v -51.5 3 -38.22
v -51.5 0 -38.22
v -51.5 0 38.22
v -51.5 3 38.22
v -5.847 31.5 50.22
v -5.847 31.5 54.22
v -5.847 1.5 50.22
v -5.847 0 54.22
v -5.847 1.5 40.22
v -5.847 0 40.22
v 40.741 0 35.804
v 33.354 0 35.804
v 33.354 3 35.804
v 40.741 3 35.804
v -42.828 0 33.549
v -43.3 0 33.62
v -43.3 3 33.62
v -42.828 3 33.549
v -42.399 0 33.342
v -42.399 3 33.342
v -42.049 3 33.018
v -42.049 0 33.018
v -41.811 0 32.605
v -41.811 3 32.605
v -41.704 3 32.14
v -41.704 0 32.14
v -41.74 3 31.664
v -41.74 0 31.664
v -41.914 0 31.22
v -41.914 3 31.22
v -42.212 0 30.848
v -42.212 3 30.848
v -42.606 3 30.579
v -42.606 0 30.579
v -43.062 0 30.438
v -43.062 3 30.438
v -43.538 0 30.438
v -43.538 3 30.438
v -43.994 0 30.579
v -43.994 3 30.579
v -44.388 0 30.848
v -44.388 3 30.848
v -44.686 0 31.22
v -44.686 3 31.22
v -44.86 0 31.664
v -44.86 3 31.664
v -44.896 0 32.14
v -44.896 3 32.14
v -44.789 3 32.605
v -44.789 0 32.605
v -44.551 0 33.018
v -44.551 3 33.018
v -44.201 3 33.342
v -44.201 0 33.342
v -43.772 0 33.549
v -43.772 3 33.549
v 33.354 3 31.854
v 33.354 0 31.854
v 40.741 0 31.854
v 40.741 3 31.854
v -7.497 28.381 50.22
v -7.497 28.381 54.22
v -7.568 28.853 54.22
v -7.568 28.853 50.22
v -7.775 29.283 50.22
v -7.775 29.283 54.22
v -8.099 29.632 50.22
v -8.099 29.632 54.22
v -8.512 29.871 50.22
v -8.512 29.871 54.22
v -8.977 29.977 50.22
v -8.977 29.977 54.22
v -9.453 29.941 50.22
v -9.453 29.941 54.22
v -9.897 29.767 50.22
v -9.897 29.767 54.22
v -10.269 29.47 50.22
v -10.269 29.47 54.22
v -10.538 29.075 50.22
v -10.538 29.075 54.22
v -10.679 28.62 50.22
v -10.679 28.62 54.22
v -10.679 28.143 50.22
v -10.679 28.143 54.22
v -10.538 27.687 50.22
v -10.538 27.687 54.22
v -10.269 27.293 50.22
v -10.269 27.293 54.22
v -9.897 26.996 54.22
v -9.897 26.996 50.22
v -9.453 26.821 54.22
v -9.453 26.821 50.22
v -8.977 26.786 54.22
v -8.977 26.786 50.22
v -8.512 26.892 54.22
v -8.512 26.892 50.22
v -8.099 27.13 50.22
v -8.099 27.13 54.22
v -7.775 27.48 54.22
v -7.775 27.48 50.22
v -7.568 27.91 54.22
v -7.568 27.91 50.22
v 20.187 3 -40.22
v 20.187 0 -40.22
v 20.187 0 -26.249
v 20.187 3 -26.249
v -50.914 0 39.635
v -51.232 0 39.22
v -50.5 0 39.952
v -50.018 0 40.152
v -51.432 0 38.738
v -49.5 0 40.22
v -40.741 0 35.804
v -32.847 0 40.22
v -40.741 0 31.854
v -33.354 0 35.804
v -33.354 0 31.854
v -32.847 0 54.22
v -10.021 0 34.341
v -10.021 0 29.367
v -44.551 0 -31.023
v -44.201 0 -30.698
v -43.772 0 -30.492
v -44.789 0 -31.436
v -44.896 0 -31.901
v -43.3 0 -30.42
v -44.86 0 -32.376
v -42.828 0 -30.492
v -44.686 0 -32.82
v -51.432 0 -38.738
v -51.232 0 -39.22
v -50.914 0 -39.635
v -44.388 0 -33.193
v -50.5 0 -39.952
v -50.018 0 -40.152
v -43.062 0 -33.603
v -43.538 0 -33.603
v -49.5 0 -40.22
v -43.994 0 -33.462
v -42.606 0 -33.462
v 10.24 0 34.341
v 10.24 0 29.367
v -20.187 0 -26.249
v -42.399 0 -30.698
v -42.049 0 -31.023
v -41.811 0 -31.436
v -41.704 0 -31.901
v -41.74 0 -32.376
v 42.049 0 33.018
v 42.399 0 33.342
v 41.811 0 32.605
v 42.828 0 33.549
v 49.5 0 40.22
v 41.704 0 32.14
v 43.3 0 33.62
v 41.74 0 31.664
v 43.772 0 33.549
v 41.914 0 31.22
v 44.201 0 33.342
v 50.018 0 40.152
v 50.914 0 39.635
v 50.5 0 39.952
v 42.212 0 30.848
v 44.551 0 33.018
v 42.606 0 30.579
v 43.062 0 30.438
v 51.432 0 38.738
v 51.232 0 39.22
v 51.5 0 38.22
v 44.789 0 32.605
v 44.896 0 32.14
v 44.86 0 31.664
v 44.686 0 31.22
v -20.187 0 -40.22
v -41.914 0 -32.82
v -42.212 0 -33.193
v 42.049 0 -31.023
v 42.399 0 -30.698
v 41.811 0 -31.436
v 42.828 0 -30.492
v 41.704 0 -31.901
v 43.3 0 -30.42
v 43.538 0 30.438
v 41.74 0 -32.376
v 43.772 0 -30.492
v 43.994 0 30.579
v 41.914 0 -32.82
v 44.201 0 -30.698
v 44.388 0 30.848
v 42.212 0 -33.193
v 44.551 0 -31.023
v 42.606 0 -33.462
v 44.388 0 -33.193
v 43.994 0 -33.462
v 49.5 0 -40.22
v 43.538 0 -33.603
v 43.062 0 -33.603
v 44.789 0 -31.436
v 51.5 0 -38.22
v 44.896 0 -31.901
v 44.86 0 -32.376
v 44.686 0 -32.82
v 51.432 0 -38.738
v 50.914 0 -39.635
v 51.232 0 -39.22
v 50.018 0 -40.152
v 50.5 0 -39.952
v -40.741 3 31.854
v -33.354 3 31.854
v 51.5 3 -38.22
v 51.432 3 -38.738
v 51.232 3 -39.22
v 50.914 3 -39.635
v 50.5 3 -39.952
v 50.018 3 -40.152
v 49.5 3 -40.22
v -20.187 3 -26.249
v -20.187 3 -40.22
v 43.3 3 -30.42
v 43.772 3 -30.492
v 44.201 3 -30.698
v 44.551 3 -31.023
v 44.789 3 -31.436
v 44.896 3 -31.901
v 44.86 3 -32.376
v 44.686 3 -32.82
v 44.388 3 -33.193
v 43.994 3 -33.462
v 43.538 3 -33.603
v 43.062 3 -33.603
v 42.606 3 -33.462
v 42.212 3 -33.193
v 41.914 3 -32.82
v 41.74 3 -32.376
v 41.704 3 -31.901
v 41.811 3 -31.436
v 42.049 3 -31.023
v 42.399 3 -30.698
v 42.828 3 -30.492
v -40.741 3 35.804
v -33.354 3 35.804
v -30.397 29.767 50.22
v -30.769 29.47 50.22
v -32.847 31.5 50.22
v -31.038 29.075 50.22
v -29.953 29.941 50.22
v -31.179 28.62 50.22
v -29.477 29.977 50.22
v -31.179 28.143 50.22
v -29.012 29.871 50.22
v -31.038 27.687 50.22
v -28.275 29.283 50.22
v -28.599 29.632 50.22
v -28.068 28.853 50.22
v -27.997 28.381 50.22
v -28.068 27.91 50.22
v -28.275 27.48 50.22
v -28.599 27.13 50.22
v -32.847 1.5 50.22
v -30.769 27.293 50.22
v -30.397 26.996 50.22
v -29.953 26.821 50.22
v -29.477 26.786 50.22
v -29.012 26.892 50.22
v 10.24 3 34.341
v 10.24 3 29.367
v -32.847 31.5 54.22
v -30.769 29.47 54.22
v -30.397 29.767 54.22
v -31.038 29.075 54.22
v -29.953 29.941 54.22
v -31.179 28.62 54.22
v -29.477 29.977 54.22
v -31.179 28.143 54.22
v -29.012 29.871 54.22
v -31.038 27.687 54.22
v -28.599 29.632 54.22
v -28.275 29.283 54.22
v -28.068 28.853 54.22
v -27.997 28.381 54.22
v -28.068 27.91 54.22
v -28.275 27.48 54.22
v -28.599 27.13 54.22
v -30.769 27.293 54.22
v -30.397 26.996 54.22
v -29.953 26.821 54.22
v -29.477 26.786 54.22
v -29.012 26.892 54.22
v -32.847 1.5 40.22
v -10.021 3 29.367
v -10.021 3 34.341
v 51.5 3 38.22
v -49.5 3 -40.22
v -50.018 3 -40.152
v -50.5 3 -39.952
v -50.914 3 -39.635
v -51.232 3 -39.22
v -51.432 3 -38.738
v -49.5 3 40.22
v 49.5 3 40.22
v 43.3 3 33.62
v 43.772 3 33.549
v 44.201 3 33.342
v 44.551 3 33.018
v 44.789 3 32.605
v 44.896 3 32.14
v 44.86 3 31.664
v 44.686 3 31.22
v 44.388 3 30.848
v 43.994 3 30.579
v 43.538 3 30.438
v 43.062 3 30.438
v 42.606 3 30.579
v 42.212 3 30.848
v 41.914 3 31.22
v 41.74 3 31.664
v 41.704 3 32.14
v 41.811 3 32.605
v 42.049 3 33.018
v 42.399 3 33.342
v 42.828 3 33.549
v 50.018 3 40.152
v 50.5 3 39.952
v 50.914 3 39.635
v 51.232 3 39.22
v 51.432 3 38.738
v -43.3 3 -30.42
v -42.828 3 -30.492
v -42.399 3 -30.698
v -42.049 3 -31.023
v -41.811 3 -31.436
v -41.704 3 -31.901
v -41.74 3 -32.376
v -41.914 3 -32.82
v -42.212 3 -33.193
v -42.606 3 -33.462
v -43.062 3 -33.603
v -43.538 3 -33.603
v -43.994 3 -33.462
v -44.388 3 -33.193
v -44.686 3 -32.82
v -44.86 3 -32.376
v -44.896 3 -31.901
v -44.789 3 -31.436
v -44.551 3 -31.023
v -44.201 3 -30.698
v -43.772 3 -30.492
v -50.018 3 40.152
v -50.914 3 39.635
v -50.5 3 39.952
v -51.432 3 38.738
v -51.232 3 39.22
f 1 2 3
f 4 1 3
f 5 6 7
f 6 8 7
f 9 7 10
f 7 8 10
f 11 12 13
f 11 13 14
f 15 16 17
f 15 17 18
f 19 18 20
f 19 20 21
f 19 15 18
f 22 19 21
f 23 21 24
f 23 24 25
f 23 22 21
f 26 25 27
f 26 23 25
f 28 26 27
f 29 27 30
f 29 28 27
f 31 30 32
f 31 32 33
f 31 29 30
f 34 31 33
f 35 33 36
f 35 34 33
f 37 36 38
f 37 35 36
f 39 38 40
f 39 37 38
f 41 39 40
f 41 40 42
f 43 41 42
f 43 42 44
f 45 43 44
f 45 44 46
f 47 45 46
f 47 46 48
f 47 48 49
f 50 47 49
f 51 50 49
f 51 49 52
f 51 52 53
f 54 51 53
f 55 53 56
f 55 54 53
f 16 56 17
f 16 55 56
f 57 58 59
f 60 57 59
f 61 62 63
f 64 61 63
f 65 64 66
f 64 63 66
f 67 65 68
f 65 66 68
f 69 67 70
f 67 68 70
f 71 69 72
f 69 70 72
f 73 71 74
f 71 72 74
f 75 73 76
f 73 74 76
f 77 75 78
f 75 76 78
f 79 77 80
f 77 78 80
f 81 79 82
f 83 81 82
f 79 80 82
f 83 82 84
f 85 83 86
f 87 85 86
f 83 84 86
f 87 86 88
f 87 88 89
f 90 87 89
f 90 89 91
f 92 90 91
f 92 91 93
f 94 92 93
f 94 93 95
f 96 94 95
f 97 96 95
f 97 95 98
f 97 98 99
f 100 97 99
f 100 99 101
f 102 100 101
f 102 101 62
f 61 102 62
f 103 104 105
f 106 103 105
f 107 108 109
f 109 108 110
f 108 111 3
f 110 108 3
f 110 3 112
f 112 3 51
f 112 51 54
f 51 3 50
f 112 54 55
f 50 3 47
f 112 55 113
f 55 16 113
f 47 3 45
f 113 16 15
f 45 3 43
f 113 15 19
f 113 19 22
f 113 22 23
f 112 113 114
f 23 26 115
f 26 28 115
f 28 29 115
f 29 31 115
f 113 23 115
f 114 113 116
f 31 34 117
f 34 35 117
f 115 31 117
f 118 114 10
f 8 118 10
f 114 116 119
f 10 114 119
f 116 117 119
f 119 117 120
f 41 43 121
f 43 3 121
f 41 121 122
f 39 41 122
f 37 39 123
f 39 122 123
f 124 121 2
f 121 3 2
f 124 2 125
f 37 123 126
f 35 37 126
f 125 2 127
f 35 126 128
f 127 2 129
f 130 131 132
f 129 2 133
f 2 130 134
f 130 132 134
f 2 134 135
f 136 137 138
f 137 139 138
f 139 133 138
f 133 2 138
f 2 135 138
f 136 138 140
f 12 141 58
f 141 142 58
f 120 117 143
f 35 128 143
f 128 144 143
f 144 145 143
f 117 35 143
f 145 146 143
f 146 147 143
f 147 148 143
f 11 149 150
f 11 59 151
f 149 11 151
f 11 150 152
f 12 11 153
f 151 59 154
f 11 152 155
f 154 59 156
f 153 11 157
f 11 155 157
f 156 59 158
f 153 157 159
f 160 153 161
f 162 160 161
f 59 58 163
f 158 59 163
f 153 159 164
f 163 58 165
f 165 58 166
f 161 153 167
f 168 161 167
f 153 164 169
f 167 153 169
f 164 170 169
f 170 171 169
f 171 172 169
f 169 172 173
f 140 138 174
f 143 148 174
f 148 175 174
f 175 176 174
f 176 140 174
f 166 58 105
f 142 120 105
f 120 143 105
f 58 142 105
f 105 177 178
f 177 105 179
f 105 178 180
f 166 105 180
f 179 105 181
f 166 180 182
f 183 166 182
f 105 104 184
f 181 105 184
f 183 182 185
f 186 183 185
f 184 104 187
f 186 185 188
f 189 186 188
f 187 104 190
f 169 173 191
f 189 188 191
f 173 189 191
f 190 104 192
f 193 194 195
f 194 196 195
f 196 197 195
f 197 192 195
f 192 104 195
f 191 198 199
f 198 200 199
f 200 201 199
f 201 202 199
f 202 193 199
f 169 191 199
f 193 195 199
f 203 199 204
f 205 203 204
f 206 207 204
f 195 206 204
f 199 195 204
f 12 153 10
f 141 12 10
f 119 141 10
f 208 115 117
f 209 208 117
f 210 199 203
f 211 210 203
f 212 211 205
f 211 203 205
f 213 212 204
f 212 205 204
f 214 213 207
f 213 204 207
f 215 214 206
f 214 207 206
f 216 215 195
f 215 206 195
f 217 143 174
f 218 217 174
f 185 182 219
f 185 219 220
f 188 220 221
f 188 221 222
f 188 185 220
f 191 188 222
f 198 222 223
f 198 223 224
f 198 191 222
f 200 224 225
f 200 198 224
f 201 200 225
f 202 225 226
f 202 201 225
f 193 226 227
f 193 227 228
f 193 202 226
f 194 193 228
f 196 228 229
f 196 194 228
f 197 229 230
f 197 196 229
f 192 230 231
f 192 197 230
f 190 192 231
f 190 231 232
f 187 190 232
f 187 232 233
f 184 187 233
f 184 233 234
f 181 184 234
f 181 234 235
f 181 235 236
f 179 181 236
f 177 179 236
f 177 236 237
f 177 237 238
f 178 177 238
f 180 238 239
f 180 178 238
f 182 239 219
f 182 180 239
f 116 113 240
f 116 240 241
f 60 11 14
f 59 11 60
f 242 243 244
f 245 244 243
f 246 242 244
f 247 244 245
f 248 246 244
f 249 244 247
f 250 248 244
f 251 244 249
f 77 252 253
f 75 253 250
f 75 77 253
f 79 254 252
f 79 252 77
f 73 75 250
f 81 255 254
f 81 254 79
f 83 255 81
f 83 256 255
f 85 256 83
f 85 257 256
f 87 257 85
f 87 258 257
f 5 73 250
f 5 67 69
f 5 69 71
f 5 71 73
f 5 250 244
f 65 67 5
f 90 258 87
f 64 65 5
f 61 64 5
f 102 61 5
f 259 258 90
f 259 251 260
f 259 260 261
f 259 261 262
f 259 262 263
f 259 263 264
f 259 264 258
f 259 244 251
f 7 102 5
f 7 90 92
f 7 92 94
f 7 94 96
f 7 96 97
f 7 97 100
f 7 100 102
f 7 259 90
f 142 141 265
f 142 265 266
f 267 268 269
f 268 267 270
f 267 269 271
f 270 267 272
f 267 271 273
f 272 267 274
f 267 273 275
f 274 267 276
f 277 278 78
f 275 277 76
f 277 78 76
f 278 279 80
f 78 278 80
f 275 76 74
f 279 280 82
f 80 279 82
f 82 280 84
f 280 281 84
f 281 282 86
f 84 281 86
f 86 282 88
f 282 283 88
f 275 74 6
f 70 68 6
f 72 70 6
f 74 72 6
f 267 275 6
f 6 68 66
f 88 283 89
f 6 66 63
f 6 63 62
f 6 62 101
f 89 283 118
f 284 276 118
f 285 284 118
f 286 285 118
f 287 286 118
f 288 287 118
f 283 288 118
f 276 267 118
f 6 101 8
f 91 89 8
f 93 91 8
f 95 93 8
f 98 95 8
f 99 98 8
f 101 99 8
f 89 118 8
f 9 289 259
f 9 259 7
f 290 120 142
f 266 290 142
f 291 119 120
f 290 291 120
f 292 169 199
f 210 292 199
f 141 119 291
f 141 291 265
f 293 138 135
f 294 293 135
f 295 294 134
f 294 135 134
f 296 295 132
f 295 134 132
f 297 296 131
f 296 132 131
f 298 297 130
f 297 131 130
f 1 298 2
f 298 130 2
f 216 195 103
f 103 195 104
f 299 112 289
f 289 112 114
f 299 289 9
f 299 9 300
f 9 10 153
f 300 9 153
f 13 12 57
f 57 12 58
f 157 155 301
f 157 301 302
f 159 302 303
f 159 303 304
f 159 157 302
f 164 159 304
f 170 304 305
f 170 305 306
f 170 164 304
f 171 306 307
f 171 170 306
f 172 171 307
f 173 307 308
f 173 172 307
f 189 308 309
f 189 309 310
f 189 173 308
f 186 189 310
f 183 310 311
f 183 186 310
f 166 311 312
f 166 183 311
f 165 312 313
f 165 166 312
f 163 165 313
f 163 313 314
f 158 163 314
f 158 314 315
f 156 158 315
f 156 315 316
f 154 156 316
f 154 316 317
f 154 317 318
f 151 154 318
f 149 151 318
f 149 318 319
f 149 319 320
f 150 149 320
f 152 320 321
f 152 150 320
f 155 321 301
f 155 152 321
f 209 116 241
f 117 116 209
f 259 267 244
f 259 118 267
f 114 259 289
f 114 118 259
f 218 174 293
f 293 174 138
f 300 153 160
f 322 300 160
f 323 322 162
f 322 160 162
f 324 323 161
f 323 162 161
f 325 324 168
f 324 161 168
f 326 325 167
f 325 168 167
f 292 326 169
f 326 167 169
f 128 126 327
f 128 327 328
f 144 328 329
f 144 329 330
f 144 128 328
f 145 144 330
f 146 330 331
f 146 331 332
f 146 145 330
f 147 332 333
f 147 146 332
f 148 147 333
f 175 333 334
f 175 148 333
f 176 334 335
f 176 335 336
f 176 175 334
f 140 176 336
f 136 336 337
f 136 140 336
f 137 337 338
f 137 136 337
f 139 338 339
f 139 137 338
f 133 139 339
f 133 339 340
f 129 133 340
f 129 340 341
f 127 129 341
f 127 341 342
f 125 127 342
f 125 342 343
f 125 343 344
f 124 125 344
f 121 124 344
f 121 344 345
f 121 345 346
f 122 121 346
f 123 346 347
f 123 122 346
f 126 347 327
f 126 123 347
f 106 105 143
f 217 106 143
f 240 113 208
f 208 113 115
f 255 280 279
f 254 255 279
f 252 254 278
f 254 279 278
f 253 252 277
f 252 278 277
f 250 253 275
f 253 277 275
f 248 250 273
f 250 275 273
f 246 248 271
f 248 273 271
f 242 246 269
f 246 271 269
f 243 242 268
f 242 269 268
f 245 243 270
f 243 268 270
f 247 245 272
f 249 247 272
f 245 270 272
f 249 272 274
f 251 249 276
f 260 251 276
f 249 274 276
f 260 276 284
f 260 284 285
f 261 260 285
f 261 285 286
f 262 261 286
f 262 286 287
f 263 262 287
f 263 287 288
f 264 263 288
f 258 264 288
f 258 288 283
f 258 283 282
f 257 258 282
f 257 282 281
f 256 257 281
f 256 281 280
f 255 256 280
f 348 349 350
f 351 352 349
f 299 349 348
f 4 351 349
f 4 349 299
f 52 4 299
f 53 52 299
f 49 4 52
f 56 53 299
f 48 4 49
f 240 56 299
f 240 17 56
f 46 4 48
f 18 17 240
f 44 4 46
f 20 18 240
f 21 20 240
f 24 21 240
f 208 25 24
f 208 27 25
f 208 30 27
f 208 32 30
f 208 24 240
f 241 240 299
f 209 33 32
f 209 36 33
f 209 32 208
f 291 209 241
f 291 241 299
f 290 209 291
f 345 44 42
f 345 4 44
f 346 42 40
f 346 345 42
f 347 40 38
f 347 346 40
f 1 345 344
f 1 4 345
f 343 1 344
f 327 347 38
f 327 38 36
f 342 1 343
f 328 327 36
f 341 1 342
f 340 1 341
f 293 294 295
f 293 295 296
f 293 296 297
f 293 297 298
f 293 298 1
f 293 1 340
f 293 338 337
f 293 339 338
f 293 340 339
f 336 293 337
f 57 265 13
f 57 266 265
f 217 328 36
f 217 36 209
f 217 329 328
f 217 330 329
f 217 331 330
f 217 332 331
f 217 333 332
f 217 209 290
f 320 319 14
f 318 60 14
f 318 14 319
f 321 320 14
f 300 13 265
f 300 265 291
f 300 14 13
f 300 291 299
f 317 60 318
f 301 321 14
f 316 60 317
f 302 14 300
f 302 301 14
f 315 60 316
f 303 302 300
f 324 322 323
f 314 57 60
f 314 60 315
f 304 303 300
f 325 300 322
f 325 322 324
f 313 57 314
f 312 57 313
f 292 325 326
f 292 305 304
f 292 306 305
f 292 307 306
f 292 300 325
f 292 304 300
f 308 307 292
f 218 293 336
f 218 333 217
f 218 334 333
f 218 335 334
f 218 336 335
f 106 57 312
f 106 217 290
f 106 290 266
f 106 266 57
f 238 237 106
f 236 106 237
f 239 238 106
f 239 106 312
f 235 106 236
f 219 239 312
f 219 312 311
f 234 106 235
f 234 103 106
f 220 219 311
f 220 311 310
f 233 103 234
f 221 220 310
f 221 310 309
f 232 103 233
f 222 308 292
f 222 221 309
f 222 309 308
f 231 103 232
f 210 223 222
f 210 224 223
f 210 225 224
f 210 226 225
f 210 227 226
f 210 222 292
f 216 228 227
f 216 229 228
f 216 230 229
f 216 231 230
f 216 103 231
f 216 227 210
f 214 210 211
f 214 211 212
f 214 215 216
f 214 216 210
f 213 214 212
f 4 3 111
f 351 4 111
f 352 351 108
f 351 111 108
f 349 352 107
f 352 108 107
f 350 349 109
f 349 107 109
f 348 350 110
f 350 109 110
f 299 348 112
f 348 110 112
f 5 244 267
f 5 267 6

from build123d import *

# Parameters (mm, degrees)
SKETCH_1_R          = 1.6
SKETCH_1_W          = 7.387531562
SKETCH_1_H          = 3.94976935
SKETCH_1_W_2        = 20.26085389
SKETCH_1_H_2        = 4.973783626
EXTRUDE_1_DEPTH     = 3
SKETCH_2_W          = 27
SKETCH_2_H          = 1.5
EXTRUDE_2_DEPTH     = 14
SKETCH_4_W          = 27
SKETCH_4_H          = 4
EXTRUDE_3_DEPTH     = 30
SKETCH_5_R          = 1.6
CUT_EXTRUDE_1_DEPTH = 30


with BuildPart() as part:
    # 草图1 → 凸台-拉伸1 (new body)
    with BuildSketch(Plane(origin=(0, 0, 0), x_dir=(1, 0, 0), z_dir=(0, 1, 0))):
        with BuildLine():
            Line((-49.5, -40.220425864), (49.5, -40.220425864))
            ThreePointArc((49.5, -40.220425864), (50.914213562, -39.634639426), (51.5, -38.220425864))
            Line((51.5, -38.220425864), (51.5, 38.220425864))
            ThreePointArc((51.5, 38.220425864), (50.914213562, 39.634639426), (49.5, 40.220425864))
            Line((49.5, 40.220425864), (20.187430173, 40.220425864))
            Line((20.187430173, 40.220425864), (20.187430173, 26.249140852))
            Line((20.187430173, 26.249140852), (-20.187430173, 26.249140852))
            Line((-20.187430173, 26.249140852), (-20.187430173, 40.220425864))
            Line((-20.187430173, 40.220425864), (-49.5, 40.220425864))
            ThreePointArc((-49.5, 40.220425864), (-50.914213562, 39.634639426), (-51.5, 38.220425864))
            Line((-51.5, 38.220425864), (-51.5, -38.220425864))
            ThreePointArc((-51.5, -38.220425864), (-50.914213562, -39.634639426), (-49.5, -40.220425864))
        make_face()
        with Locations(Location((-43.3, -32.020425864, 0), (0, 0, 270))):
            Circle(SKETCH_1_R, mode=Mode.SUBTRACT)
        with Locations((-37.047373629, -33.829043047)):
            Rectangle(SKETCH_1_W, SKETCH_1_H, mode=Mode.SUBTRACT)
        with Locations((0.109715815, -31.854158372)):
            Rectangle(SKETCH_1_W_2, SKETCH_1_H_2, mode=Mode.SUBTRACT)
        with Locations((37.047373629, -33.829043047)):
            Rectangle(SKETCH_1_W, SKETCH_1_H, mode=Mode.SUBTRACT)
        with Locations(Location((43.3, -32.020425864, 0), (0, 0, 270))):
            Circle(SKETCH_1_R, mode=Mode.SUBTRACT)
        with Locations(Location((43.3, 32.020425864, 0), (0, 0, 270))):
            Circle(SKETCH_1_R, mode=Mode.SUBTRACT)
        with Locations(Location((-43.3, 32.020425864, 0), (0, 0, 270))):
            Circle(SKETCH_1_R, mode=Mode.SUBTRACT)
    extrude(amount=EXTRUDE_1_DEPTH)

    # 草图2 → 凸台-拉伸2 (add)
    with BuildSketch(Plane.XY.offset(40.220425864)):
        with Locations((-19.346509013, 0.75)):
            Rectangle(SKETCH_2_W, SKETCH_2_H)
    extrude(amount=EXTRUDE_2_DEPTH)

    # 草图4 → 凸台-拉伸3 (add)
    with BuildSketch(Plane(origin=(0, 1.5, 0), x_dir=(1, 0, 0), z_dir=(0, 1, 0))):
        with Locations((-19.346509013, -52.220425864)):
            Rectangle(SKETCH_4_W, SKETCH_4_H)
    extrude(amount=EXTRUDE_3_DEPTH)

    # 草图5 → 切除-拉伸1 (cut)
    with BuildSketch(Plane.XY.offset(54.220425864)):
        with Locations((-29.596509013, 28.381274353)):
            Circle(SKETCH_5_R)
        with Locations((-9.096509013, 28.381274353)):
            Circle(SKETCH_5_R)
    extrude(amount=-CUT_EXTRUDE_1_DEPTH, mode=Mode.SUBTRACT)


solid = part.part
